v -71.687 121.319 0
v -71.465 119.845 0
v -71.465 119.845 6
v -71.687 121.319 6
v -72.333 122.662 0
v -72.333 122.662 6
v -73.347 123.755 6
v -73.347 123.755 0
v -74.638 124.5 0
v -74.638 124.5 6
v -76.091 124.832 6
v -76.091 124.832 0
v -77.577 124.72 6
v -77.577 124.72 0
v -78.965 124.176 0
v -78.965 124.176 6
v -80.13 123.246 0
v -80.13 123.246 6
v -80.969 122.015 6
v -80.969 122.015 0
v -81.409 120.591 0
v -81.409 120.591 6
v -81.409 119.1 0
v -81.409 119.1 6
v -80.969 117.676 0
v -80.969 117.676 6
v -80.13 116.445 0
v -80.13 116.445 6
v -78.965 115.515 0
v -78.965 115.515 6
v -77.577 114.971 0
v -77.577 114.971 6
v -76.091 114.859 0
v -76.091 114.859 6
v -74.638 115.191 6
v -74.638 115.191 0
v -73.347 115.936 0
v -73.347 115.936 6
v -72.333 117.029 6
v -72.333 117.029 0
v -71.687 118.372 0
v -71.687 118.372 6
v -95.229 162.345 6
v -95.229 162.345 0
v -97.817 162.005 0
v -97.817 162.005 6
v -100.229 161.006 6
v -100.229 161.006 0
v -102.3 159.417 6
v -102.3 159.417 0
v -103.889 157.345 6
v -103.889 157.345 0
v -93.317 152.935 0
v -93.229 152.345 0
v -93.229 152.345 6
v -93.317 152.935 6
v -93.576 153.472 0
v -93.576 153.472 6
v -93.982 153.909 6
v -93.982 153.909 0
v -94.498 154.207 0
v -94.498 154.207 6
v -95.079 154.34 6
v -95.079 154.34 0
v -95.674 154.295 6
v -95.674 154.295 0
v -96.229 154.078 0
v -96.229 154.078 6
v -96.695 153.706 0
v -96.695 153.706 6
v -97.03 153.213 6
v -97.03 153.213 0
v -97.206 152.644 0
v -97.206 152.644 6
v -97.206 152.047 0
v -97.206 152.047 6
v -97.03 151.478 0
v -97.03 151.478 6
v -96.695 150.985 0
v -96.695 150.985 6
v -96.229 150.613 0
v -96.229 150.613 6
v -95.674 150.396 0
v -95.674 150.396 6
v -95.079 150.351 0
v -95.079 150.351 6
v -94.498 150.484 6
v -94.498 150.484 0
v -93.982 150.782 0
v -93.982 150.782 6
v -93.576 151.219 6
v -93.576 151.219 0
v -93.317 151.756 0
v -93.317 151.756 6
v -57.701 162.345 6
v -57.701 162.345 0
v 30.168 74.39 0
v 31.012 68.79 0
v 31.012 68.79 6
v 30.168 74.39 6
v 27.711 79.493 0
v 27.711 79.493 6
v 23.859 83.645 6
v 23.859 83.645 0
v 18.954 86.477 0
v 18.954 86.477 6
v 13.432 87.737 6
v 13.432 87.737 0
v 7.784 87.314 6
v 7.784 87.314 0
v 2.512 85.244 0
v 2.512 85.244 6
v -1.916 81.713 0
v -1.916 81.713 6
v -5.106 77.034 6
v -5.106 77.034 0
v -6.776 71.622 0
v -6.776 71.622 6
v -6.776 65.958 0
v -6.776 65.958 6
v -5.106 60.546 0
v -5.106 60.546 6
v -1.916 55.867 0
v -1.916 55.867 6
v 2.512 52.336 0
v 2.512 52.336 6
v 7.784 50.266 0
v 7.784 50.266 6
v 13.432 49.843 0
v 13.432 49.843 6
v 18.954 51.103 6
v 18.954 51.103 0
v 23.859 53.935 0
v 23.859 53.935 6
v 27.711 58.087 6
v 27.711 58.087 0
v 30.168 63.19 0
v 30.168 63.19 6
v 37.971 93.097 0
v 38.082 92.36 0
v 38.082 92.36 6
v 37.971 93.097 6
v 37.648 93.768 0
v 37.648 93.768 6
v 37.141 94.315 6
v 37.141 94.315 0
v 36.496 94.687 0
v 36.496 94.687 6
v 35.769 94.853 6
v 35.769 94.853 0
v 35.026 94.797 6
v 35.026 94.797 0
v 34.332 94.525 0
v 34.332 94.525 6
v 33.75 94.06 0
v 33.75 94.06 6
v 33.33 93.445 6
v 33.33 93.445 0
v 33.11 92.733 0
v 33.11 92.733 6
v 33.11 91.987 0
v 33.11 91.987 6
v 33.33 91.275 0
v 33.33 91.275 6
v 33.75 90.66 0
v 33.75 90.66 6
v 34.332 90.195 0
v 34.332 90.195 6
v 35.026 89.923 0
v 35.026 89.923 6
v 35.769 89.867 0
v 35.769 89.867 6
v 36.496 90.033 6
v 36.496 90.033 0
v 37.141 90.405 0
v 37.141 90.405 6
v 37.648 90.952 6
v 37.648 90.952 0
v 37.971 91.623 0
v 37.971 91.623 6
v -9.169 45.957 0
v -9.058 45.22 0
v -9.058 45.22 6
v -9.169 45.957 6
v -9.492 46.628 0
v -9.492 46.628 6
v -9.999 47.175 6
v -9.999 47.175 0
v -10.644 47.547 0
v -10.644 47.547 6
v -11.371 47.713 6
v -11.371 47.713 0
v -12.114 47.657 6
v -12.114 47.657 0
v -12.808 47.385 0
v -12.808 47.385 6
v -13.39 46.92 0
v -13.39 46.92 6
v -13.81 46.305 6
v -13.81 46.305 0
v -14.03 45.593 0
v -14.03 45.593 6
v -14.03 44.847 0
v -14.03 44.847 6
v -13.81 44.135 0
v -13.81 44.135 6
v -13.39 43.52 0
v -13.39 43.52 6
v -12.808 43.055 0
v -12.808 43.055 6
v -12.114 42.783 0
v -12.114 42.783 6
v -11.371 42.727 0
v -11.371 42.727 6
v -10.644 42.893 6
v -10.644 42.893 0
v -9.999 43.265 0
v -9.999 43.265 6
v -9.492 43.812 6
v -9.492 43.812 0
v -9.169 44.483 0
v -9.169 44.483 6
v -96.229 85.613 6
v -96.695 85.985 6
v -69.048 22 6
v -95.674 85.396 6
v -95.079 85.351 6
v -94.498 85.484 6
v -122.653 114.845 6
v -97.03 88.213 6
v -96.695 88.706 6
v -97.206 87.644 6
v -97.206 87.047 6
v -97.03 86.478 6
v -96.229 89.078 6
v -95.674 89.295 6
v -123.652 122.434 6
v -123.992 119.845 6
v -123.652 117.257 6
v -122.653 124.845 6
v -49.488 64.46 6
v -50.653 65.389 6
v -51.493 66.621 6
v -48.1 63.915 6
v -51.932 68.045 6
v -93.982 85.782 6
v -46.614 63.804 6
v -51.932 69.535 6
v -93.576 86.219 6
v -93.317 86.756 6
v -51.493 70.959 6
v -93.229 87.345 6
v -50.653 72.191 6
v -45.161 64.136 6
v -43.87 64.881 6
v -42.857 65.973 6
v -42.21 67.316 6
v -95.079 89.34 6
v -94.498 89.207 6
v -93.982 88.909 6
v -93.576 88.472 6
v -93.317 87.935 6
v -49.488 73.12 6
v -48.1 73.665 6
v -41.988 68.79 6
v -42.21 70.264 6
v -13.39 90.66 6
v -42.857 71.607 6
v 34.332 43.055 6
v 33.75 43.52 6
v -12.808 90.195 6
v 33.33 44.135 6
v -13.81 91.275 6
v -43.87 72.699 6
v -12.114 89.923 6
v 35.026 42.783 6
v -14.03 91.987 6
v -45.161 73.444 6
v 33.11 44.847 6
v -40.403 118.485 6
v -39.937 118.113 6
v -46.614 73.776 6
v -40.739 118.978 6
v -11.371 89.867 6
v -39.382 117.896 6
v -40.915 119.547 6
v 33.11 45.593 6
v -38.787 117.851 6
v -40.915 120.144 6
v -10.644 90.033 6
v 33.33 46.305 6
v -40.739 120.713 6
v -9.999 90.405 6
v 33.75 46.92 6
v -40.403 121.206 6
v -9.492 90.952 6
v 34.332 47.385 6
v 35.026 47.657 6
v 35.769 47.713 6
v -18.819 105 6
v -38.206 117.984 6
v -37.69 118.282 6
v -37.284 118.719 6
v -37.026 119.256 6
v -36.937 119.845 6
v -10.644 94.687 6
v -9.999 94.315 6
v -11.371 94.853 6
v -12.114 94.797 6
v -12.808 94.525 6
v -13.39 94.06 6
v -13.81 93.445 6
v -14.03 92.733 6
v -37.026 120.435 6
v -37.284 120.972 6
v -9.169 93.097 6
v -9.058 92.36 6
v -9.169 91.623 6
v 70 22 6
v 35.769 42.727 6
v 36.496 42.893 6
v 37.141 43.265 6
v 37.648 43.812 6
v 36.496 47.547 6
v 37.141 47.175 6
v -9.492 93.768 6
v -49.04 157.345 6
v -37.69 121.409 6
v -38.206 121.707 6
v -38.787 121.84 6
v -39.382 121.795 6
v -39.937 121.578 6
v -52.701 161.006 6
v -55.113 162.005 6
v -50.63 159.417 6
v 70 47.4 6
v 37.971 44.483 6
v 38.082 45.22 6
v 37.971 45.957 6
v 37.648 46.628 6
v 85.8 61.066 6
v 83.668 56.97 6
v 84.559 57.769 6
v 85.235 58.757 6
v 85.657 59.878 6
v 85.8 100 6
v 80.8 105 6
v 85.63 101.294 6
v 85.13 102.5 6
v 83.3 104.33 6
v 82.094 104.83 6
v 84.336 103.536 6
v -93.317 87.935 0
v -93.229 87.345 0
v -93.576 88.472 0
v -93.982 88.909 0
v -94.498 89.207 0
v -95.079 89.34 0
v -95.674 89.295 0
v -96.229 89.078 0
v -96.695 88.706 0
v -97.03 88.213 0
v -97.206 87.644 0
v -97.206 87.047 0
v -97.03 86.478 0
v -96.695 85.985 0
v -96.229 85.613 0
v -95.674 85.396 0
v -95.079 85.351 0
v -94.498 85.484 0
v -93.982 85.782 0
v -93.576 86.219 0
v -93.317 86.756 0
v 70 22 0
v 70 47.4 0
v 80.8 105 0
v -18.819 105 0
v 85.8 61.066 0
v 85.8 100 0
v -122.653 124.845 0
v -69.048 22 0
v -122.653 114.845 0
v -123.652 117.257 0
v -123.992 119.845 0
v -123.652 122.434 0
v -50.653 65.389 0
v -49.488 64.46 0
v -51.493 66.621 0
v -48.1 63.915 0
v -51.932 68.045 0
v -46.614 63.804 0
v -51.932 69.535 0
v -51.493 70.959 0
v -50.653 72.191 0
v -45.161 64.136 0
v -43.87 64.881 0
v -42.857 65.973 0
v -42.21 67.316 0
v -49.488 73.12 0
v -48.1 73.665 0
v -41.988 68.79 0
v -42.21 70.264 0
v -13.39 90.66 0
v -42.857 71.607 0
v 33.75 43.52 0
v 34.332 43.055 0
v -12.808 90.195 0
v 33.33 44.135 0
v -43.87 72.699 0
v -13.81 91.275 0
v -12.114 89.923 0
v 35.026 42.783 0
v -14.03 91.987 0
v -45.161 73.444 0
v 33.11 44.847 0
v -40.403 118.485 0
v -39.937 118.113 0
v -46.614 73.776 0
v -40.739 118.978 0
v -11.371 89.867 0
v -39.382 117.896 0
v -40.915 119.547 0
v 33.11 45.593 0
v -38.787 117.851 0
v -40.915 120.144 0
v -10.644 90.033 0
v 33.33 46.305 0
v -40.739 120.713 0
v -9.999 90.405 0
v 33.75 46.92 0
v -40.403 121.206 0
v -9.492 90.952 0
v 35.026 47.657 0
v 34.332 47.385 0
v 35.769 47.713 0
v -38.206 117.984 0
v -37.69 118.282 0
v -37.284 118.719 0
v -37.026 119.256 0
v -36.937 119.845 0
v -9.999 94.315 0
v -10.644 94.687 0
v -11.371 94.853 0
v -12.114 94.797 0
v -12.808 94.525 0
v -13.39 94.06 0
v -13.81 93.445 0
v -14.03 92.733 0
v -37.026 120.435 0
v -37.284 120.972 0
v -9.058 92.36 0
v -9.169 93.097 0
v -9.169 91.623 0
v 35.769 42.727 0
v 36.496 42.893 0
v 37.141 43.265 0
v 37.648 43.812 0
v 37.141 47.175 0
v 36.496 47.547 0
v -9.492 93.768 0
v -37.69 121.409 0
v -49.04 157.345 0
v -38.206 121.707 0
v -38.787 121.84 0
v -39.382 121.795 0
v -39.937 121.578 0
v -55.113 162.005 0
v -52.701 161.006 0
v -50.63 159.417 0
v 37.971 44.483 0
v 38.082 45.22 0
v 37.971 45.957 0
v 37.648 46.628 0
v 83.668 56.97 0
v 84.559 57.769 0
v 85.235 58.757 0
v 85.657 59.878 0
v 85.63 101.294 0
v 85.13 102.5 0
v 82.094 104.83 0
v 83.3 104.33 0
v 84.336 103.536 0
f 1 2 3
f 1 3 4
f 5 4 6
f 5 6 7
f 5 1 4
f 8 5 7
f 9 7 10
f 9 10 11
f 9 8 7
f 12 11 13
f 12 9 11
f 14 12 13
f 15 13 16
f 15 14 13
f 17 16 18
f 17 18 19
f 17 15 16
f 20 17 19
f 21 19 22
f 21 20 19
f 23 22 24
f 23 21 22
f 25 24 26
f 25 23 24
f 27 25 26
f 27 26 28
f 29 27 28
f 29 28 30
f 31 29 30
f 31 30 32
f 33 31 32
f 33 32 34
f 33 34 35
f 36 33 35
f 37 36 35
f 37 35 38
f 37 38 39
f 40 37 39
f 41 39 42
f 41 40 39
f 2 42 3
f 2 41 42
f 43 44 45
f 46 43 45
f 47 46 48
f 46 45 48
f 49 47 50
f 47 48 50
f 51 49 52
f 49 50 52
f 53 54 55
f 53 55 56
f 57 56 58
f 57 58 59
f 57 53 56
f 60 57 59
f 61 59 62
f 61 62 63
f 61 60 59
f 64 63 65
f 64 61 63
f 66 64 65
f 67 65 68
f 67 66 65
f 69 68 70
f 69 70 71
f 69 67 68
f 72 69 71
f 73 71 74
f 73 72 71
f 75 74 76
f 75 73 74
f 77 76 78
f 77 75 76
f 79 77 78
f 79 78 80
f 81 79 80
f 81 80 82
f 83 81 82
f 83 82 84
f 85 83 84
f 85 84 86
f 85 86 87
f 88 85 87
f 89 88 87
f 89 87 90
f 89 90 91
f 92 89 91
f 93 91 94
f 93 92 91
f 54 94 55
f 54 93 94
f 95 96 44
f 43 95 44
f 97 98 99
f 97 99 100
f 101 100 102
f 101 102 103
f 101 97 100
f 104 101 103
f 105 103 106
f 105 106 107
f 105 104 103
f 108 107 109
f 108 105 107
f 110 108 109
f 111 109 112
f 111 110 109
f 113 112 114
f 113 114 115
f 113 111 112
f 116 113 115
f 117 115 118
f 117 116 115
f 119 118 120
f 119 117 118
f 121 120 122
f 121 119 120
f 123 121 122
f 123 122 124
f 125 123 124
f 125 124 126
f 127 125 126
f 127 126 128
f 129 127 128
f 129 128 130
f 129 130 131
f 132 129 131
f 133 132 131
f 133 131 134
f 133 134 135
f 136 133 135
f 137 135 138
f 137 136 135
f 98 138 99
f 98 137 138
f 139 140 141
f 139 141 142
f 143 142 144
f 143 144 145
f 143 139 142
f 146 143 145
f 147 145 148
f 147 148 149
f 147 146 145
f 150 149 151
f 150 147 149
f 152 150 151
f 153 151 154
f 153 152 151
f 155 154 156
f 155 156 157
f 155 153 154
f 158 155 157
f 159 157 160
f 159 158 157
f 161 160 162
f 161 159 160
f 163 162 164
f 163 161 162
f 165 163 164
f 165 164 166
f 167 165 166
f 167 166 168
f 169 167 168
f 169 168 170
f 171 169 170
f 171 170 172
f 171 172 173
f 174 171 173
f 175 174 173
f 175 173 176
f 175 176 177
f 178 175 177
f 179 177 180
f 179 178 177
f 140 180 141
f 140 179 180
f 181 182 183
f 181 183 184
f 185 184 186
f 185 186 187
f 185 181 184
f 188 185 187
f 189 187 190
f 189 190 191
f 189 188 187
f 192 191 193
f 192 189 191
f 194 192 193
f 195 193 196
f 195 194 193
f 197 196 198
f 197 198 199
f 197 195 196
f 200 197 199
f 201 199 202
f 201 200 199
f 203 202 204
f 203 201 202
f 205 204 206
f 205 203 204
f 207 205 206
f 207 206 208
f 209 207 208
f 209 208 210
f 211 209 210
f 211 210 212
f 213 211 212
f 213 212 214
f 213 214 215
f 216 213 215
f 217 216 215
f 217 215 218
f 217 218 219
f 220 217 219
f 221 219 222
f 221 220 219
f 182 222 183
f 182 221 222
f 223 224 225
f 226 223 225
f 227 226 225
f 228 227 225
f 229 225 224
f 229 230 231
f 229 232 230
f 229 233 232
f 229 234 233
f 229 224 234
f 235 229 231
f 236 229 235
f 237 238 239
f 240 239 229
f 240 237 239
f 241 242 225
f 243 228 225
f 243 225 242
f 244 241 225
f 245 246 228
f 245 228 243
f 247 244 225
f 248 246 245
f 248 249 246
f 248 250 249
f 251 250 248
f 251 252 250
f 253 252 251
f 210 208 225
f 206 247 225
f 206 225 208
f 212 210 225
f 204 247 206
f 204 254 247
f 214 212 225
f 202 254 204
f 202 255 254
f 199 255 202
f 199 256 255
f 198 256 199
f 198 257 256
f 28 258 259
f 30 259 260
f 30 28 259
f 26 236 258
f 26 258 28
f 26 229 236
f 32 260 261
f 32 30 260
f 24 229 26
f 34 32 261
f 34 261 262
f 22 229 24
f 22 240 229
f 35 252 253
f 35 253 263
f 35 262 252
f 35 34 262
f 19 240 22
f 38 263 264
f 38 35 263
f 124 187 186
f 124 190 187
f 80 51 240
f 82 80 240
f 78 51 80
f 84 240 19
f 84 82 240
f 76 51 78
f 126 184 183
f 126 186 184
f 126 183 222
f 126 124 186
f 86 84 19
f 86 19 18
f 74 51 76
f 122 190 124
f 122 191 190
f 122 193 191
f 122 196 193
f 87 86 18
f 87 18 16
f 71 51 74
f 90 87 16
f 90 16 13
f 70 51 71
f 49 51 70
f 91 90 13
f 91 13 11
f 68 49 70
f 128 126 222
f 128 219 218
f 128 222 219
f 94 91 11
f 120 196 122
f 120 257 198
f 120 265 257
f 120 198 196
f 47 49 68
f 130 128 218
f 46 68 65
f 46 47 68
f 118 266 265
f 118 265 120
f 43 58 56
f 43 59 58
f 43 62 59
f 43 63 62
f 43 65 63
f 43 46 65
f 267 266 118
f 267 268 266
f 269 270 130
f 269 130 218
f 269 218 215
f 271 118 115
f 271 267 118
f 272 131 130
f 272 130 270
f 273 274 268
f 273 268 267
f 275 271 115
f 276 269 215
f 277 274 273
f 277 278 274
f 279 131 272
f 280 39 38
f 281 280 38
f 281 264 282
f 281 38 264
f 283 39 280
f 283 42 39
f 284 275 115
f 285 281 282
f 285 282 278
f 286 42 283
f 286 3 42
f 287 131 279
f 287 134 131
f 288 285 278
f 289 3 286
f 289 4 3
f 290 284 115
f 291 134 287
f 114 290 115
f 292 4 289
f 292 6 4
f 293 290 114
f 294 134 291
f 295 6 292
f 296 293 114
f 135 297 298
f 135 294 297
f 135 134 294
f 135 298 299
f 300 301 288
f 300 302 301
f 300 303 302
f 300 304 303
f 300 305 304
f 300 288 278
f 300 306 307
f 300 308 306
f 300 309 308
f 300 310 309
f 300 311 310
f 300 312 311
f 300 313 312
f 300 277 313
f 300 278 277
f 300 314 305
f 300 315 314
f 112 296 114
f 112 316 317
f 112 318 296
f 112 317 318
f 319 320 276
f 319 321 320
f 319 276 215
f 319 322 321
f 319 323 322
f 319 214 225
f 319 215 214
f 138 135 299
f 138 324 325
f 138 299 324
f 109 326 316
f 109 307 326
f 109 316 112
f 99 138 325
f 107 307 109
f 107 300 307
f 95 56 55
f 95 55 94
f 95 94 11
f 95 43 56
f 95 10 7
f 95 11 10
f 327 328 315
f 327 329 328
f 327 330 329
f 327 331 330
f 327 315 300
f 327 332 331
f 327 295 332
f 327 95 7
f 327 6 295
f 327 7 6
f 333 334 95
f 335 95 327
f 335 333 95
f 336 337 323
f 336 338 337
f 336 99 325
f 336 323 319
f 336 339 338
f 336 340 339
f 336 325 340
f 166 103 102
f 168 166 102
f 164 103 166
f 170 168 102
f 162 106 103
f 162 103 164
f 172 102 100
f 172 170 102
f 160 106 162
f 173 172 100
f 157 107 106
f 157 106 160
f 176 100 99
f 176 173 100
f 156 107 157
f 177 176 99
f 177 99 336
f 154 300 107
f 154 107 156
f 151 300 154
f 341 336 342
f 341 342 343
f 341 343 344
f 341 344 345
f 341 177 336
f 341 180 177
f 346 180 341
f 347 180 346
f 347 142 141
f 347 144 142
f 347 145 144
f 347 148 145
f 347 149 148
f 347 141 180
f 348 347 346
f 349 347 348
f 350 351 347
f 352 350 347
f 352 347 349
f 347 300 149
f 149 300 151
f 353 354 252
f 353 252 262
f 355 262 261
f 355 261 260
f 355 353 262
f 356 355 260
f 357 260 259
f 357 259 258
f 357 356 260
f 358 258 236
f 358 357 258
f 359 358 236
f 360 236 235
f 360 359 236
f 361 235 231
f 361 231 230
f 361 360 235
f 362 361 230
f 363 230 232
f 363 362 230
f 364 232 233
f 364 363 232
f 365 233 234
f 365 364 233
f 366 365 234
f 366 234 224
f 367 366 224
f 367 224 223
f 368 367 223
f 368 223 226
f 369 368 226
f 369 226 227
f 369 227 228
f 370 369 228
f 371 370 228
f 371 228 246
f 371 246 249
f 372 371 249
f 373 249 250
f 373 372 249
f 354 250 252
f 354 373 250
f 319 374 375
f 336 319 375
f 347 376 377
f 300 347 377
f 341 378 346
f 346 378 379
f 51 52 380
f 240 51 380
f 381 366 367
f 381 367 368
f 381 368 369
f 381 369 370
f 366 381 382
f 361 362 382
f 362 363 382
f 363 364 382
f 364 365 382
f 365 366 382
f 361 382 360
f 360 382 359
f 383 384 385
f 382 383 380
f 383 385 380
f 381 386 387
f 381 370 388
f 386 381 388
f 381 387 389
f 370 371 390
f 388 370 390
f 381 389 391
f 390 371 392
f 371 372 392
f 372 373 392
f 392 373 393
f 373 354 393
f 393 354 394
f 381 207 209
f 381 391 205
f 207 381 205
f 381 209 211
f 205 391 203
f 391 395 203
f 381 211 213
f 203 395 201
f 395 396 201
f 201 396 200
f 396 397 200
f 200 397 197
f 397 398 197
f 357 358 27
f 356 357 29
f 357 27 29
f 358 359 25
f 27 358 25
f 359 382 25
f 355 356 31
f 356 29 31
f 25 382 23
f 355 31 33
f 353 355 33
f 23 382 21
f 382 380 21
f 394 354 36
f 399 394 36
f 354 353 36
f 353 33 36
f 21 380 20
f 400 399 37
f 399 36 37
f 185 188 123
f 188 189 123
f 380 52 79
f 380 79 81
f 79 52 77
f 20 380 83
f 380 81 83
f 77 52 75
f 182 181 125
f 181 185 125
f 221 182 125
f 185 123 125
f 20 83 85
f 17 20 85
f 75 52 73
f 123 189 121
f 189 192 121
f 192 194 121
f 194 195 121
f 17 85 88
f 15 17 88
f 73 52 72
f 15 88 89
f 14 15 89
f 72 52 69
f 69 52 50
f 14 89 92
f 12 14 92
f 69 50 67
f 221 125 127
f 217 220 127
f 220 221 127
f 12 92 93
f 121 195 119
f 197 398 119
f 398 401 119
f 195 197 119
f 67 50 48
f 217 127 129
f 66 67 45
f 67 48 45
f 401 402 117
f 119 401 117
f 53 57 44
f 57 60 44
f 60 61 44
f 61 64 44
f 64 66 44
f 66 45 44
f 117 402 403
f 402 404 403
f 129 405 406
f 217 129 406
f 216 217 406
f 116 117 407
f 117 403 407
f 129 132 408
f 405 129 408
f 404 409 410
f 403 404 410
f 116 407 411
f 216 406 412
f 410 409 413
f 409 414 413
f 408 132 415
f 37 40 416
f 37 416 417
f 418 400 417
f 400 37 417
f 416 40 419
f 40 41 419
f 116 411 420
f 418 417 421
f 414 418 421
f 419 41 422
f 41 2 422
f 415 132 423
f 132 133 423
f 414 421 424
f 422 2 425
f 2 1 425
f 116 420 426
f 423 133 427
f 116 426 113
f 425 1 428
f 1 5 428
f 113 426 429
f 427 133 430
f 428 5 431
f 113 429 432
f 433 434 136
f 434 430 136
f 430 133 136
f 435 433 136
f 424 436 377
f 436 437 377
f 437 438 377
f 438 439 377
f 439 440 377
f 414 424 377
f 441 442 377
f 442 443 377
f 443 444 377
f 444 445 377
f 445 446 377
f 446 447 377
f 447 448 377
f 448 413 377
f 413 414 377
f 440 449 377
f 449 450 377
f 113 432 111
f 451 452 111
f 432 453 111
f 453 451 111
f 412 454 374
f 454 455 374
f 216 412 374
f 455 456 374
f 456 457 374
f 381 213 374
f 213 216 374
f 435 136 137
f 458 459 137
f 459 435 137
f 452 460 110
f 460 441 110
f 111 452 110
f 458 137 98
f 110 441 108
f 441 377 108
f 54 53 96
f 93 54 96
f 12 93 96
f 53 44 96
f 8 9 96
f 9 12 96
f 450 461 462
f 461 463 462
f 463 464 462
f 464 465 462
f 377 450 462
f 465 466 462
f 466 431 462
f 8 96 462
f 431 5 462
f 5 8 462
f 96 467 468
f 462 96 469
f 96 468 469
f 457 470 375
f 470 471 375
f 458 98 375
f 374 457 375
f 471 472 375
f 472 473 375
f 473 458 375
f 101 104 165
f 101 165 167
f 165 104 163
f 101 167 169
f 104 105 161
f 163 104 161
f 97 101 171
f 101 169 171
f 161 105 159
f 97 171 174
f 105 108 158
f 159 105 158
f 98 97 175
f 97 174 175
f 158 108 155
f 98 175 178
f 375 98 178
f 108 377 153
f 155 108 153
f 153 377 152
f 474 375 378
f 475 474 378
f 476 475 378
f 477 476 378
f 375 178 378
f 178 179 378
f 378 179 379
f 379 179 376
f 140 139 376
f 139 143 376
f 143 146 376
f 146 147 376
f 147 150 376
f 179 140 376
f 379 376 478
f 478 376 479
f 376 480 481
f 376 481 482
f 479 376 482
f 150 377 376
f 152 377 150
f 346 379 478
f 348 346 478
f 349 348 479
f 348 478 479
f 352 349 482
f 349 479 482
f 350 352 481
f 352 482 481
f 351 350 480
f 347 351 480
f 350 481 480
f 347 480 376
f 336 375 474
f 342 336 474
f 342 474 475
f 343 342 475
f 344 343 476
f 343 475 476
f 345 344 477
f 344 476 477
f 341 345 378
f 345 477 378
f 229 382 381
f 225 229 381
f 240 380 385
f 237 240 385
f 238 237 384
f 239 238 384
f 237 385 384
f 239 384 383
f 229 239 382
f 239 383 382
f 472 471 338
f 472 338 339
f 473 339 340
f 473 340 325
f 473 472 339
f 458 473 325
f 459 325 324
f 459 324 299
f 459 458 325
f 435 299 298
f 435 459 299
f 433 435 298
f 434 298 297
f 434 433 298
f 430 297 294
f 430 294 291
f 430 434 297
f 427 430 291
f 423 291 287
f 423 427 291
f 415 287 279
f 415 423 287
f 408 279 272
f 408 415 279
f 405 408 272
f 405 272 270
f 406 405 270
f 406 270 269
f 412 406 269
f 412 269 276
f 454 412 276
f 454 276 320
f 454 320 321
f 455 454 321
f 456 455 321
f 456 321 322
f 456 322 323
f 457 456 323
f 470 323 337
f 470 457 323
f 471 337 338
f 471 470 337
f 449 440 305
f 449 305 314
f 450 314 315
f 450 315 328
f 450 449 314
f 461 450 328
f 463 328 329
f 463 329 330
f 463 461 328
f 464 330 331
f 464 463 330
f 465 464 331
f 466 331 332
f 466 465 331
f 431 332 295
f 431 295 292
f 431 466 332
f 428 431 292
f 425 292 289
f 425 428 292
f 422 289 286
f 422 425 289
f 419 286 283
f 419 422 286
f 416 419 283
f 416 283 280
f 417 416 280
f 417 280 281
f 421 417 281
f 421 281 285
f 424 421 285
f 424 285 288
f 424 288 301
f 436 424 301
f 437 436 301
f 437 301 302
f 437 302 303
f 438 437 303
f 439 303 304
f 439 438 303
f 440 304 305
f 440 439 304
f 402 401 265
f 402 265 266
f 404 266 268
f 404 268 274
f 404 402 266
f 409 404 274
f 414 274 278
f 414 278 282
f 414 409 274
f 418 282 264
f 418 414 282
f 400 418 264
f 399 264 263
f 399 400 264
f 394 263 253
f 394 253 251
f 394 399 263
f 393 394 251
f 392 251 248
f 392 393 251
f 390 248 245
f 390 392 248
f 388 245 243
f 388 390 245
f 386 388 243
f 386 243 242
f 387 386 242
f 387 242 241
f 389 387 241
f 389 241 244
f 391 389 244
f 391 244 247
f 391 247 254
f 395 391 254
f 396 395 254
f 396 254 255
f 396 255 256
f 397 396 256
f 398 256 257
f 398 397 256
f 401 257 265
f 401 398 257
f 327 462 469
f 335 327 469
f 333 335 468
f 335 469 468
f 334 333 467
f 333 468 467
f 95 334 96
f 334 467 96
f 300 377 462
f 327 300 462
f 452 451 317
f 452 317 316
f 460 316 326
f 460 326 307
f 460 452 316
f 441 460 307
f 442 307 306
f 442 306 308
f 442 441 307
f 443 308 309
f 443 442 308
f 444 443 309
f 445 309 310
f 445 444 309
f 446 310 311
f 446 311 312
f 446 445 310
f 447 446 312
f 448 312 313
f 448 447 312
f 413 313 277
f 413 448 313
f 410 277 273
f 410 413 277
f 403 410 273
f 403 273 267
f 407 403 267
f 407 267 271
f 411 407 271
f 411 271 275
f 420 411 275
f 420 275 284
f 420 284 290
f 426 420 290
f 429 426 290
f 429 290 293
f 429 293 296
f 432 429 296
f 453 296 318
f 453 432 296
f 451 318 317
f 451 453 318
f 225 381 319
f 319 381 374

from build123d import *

# Parameters (mm, degrees)
SKETCH2_R           = 2.5
SKETCH2_R_2         = 19
SKETCH2_R_3         = 5
SKETCH2_R_4         = 2
BOSS_EXTRUDE2_DEPTH = 6


with BuildPart() as part:
    # Sketch2 → Boss-Extrude2 (new body)
    with BuildSketch(Plane.XY):
        with BuildLine():
            Line((-69.048275573, 22), (70, 22))
            Line((70, 22), (70, 47.4))
            Line((70, 47.4), (83.667882182, 56.970354135))
            ThreePointArc((83.667882182, 56.970354135), (85.235054166, 58.75737129), (85.8, 61.066114356))
            Line((85.8, 61.066114356), (85.8, 100))
            ThreePointArc((85.8, 100), (84.335533906, 103.535533906), (80.8, 105))
            Line((80.8, 105), (-18.818802154, 105))
            Line((-18.818802154, 105), (-49.04048999, 157.345498823))
            ThreePointArc((-49.04048999, 157.345498823), (-52.700744028, 161.005752861), (-57.700744028, 162.345498823))
            Line((-57.700744028, 162.345498823), (-95.228511525, 162.345498823))
            ThreePointArc((-95.228511525, 162.345498823), (-100.228511525, 161.005752861), (-103.888765563, 157.345498823))
            Line((-103.888765563, 157.345498823), (-122.652649312, 124.845498823))
            ThreePointArc((-122.652649312, 124.845498823), (-123.992395274, 119.845498823), (-122.652649312, 114.845498823))
            Line((-122.652649312, 114.845498823), (-69.048275573, 22))
        make_face()
        with Locations((-11.557721787, 45.22)):
            Circle(SKETCH2_R, mode=Mode.SUBTRACT)
        with Locations((35.582278213, 45.22)):
            Circle(SKETCH2_R, mode=Mode.SUBTRACT)
        with Locations((35.582278213, 92.36)):
            Circle(SKETCH2_R, mode=Mode.SUBTRACT)
        with Locations((12.012278213, 68.79)):
            Circle(SKETCH2_R_2, mode=Mode.SUBTRACT)
        with Locations((-11.557721787, 92.36)):
            Circle(SKETCH2_R, mode=Mode.SUBTRACT)
        with Locations((-46.987721787, 68.79)):
            Circle(SKETCH2_R_3, mode=Mode.SUBTRACT)
        with Locations((-38.936860279, 119.845498823)):
            Circle(SKETCH2_R_4, mode=Mode.SUBTRACT)
        with Locations((-95.228511525, 87.345498823)):
            Circle(SKETCH2_R_4, mode=Mode.SUBTRACT)
        with Locations((-76.464627777, 119.845498823)):
            Circle(SKETCH2_R_3, mode=Mode.SUBTRACT)
        with Locations((-95.228511525, 152.345498823)):
            Circle(SKETCH2_R_4, mode=Mode.SUBTRACT)
    extrude(amount=BOSS_EXTRUDE2_DEPTH)


solid = part.part
